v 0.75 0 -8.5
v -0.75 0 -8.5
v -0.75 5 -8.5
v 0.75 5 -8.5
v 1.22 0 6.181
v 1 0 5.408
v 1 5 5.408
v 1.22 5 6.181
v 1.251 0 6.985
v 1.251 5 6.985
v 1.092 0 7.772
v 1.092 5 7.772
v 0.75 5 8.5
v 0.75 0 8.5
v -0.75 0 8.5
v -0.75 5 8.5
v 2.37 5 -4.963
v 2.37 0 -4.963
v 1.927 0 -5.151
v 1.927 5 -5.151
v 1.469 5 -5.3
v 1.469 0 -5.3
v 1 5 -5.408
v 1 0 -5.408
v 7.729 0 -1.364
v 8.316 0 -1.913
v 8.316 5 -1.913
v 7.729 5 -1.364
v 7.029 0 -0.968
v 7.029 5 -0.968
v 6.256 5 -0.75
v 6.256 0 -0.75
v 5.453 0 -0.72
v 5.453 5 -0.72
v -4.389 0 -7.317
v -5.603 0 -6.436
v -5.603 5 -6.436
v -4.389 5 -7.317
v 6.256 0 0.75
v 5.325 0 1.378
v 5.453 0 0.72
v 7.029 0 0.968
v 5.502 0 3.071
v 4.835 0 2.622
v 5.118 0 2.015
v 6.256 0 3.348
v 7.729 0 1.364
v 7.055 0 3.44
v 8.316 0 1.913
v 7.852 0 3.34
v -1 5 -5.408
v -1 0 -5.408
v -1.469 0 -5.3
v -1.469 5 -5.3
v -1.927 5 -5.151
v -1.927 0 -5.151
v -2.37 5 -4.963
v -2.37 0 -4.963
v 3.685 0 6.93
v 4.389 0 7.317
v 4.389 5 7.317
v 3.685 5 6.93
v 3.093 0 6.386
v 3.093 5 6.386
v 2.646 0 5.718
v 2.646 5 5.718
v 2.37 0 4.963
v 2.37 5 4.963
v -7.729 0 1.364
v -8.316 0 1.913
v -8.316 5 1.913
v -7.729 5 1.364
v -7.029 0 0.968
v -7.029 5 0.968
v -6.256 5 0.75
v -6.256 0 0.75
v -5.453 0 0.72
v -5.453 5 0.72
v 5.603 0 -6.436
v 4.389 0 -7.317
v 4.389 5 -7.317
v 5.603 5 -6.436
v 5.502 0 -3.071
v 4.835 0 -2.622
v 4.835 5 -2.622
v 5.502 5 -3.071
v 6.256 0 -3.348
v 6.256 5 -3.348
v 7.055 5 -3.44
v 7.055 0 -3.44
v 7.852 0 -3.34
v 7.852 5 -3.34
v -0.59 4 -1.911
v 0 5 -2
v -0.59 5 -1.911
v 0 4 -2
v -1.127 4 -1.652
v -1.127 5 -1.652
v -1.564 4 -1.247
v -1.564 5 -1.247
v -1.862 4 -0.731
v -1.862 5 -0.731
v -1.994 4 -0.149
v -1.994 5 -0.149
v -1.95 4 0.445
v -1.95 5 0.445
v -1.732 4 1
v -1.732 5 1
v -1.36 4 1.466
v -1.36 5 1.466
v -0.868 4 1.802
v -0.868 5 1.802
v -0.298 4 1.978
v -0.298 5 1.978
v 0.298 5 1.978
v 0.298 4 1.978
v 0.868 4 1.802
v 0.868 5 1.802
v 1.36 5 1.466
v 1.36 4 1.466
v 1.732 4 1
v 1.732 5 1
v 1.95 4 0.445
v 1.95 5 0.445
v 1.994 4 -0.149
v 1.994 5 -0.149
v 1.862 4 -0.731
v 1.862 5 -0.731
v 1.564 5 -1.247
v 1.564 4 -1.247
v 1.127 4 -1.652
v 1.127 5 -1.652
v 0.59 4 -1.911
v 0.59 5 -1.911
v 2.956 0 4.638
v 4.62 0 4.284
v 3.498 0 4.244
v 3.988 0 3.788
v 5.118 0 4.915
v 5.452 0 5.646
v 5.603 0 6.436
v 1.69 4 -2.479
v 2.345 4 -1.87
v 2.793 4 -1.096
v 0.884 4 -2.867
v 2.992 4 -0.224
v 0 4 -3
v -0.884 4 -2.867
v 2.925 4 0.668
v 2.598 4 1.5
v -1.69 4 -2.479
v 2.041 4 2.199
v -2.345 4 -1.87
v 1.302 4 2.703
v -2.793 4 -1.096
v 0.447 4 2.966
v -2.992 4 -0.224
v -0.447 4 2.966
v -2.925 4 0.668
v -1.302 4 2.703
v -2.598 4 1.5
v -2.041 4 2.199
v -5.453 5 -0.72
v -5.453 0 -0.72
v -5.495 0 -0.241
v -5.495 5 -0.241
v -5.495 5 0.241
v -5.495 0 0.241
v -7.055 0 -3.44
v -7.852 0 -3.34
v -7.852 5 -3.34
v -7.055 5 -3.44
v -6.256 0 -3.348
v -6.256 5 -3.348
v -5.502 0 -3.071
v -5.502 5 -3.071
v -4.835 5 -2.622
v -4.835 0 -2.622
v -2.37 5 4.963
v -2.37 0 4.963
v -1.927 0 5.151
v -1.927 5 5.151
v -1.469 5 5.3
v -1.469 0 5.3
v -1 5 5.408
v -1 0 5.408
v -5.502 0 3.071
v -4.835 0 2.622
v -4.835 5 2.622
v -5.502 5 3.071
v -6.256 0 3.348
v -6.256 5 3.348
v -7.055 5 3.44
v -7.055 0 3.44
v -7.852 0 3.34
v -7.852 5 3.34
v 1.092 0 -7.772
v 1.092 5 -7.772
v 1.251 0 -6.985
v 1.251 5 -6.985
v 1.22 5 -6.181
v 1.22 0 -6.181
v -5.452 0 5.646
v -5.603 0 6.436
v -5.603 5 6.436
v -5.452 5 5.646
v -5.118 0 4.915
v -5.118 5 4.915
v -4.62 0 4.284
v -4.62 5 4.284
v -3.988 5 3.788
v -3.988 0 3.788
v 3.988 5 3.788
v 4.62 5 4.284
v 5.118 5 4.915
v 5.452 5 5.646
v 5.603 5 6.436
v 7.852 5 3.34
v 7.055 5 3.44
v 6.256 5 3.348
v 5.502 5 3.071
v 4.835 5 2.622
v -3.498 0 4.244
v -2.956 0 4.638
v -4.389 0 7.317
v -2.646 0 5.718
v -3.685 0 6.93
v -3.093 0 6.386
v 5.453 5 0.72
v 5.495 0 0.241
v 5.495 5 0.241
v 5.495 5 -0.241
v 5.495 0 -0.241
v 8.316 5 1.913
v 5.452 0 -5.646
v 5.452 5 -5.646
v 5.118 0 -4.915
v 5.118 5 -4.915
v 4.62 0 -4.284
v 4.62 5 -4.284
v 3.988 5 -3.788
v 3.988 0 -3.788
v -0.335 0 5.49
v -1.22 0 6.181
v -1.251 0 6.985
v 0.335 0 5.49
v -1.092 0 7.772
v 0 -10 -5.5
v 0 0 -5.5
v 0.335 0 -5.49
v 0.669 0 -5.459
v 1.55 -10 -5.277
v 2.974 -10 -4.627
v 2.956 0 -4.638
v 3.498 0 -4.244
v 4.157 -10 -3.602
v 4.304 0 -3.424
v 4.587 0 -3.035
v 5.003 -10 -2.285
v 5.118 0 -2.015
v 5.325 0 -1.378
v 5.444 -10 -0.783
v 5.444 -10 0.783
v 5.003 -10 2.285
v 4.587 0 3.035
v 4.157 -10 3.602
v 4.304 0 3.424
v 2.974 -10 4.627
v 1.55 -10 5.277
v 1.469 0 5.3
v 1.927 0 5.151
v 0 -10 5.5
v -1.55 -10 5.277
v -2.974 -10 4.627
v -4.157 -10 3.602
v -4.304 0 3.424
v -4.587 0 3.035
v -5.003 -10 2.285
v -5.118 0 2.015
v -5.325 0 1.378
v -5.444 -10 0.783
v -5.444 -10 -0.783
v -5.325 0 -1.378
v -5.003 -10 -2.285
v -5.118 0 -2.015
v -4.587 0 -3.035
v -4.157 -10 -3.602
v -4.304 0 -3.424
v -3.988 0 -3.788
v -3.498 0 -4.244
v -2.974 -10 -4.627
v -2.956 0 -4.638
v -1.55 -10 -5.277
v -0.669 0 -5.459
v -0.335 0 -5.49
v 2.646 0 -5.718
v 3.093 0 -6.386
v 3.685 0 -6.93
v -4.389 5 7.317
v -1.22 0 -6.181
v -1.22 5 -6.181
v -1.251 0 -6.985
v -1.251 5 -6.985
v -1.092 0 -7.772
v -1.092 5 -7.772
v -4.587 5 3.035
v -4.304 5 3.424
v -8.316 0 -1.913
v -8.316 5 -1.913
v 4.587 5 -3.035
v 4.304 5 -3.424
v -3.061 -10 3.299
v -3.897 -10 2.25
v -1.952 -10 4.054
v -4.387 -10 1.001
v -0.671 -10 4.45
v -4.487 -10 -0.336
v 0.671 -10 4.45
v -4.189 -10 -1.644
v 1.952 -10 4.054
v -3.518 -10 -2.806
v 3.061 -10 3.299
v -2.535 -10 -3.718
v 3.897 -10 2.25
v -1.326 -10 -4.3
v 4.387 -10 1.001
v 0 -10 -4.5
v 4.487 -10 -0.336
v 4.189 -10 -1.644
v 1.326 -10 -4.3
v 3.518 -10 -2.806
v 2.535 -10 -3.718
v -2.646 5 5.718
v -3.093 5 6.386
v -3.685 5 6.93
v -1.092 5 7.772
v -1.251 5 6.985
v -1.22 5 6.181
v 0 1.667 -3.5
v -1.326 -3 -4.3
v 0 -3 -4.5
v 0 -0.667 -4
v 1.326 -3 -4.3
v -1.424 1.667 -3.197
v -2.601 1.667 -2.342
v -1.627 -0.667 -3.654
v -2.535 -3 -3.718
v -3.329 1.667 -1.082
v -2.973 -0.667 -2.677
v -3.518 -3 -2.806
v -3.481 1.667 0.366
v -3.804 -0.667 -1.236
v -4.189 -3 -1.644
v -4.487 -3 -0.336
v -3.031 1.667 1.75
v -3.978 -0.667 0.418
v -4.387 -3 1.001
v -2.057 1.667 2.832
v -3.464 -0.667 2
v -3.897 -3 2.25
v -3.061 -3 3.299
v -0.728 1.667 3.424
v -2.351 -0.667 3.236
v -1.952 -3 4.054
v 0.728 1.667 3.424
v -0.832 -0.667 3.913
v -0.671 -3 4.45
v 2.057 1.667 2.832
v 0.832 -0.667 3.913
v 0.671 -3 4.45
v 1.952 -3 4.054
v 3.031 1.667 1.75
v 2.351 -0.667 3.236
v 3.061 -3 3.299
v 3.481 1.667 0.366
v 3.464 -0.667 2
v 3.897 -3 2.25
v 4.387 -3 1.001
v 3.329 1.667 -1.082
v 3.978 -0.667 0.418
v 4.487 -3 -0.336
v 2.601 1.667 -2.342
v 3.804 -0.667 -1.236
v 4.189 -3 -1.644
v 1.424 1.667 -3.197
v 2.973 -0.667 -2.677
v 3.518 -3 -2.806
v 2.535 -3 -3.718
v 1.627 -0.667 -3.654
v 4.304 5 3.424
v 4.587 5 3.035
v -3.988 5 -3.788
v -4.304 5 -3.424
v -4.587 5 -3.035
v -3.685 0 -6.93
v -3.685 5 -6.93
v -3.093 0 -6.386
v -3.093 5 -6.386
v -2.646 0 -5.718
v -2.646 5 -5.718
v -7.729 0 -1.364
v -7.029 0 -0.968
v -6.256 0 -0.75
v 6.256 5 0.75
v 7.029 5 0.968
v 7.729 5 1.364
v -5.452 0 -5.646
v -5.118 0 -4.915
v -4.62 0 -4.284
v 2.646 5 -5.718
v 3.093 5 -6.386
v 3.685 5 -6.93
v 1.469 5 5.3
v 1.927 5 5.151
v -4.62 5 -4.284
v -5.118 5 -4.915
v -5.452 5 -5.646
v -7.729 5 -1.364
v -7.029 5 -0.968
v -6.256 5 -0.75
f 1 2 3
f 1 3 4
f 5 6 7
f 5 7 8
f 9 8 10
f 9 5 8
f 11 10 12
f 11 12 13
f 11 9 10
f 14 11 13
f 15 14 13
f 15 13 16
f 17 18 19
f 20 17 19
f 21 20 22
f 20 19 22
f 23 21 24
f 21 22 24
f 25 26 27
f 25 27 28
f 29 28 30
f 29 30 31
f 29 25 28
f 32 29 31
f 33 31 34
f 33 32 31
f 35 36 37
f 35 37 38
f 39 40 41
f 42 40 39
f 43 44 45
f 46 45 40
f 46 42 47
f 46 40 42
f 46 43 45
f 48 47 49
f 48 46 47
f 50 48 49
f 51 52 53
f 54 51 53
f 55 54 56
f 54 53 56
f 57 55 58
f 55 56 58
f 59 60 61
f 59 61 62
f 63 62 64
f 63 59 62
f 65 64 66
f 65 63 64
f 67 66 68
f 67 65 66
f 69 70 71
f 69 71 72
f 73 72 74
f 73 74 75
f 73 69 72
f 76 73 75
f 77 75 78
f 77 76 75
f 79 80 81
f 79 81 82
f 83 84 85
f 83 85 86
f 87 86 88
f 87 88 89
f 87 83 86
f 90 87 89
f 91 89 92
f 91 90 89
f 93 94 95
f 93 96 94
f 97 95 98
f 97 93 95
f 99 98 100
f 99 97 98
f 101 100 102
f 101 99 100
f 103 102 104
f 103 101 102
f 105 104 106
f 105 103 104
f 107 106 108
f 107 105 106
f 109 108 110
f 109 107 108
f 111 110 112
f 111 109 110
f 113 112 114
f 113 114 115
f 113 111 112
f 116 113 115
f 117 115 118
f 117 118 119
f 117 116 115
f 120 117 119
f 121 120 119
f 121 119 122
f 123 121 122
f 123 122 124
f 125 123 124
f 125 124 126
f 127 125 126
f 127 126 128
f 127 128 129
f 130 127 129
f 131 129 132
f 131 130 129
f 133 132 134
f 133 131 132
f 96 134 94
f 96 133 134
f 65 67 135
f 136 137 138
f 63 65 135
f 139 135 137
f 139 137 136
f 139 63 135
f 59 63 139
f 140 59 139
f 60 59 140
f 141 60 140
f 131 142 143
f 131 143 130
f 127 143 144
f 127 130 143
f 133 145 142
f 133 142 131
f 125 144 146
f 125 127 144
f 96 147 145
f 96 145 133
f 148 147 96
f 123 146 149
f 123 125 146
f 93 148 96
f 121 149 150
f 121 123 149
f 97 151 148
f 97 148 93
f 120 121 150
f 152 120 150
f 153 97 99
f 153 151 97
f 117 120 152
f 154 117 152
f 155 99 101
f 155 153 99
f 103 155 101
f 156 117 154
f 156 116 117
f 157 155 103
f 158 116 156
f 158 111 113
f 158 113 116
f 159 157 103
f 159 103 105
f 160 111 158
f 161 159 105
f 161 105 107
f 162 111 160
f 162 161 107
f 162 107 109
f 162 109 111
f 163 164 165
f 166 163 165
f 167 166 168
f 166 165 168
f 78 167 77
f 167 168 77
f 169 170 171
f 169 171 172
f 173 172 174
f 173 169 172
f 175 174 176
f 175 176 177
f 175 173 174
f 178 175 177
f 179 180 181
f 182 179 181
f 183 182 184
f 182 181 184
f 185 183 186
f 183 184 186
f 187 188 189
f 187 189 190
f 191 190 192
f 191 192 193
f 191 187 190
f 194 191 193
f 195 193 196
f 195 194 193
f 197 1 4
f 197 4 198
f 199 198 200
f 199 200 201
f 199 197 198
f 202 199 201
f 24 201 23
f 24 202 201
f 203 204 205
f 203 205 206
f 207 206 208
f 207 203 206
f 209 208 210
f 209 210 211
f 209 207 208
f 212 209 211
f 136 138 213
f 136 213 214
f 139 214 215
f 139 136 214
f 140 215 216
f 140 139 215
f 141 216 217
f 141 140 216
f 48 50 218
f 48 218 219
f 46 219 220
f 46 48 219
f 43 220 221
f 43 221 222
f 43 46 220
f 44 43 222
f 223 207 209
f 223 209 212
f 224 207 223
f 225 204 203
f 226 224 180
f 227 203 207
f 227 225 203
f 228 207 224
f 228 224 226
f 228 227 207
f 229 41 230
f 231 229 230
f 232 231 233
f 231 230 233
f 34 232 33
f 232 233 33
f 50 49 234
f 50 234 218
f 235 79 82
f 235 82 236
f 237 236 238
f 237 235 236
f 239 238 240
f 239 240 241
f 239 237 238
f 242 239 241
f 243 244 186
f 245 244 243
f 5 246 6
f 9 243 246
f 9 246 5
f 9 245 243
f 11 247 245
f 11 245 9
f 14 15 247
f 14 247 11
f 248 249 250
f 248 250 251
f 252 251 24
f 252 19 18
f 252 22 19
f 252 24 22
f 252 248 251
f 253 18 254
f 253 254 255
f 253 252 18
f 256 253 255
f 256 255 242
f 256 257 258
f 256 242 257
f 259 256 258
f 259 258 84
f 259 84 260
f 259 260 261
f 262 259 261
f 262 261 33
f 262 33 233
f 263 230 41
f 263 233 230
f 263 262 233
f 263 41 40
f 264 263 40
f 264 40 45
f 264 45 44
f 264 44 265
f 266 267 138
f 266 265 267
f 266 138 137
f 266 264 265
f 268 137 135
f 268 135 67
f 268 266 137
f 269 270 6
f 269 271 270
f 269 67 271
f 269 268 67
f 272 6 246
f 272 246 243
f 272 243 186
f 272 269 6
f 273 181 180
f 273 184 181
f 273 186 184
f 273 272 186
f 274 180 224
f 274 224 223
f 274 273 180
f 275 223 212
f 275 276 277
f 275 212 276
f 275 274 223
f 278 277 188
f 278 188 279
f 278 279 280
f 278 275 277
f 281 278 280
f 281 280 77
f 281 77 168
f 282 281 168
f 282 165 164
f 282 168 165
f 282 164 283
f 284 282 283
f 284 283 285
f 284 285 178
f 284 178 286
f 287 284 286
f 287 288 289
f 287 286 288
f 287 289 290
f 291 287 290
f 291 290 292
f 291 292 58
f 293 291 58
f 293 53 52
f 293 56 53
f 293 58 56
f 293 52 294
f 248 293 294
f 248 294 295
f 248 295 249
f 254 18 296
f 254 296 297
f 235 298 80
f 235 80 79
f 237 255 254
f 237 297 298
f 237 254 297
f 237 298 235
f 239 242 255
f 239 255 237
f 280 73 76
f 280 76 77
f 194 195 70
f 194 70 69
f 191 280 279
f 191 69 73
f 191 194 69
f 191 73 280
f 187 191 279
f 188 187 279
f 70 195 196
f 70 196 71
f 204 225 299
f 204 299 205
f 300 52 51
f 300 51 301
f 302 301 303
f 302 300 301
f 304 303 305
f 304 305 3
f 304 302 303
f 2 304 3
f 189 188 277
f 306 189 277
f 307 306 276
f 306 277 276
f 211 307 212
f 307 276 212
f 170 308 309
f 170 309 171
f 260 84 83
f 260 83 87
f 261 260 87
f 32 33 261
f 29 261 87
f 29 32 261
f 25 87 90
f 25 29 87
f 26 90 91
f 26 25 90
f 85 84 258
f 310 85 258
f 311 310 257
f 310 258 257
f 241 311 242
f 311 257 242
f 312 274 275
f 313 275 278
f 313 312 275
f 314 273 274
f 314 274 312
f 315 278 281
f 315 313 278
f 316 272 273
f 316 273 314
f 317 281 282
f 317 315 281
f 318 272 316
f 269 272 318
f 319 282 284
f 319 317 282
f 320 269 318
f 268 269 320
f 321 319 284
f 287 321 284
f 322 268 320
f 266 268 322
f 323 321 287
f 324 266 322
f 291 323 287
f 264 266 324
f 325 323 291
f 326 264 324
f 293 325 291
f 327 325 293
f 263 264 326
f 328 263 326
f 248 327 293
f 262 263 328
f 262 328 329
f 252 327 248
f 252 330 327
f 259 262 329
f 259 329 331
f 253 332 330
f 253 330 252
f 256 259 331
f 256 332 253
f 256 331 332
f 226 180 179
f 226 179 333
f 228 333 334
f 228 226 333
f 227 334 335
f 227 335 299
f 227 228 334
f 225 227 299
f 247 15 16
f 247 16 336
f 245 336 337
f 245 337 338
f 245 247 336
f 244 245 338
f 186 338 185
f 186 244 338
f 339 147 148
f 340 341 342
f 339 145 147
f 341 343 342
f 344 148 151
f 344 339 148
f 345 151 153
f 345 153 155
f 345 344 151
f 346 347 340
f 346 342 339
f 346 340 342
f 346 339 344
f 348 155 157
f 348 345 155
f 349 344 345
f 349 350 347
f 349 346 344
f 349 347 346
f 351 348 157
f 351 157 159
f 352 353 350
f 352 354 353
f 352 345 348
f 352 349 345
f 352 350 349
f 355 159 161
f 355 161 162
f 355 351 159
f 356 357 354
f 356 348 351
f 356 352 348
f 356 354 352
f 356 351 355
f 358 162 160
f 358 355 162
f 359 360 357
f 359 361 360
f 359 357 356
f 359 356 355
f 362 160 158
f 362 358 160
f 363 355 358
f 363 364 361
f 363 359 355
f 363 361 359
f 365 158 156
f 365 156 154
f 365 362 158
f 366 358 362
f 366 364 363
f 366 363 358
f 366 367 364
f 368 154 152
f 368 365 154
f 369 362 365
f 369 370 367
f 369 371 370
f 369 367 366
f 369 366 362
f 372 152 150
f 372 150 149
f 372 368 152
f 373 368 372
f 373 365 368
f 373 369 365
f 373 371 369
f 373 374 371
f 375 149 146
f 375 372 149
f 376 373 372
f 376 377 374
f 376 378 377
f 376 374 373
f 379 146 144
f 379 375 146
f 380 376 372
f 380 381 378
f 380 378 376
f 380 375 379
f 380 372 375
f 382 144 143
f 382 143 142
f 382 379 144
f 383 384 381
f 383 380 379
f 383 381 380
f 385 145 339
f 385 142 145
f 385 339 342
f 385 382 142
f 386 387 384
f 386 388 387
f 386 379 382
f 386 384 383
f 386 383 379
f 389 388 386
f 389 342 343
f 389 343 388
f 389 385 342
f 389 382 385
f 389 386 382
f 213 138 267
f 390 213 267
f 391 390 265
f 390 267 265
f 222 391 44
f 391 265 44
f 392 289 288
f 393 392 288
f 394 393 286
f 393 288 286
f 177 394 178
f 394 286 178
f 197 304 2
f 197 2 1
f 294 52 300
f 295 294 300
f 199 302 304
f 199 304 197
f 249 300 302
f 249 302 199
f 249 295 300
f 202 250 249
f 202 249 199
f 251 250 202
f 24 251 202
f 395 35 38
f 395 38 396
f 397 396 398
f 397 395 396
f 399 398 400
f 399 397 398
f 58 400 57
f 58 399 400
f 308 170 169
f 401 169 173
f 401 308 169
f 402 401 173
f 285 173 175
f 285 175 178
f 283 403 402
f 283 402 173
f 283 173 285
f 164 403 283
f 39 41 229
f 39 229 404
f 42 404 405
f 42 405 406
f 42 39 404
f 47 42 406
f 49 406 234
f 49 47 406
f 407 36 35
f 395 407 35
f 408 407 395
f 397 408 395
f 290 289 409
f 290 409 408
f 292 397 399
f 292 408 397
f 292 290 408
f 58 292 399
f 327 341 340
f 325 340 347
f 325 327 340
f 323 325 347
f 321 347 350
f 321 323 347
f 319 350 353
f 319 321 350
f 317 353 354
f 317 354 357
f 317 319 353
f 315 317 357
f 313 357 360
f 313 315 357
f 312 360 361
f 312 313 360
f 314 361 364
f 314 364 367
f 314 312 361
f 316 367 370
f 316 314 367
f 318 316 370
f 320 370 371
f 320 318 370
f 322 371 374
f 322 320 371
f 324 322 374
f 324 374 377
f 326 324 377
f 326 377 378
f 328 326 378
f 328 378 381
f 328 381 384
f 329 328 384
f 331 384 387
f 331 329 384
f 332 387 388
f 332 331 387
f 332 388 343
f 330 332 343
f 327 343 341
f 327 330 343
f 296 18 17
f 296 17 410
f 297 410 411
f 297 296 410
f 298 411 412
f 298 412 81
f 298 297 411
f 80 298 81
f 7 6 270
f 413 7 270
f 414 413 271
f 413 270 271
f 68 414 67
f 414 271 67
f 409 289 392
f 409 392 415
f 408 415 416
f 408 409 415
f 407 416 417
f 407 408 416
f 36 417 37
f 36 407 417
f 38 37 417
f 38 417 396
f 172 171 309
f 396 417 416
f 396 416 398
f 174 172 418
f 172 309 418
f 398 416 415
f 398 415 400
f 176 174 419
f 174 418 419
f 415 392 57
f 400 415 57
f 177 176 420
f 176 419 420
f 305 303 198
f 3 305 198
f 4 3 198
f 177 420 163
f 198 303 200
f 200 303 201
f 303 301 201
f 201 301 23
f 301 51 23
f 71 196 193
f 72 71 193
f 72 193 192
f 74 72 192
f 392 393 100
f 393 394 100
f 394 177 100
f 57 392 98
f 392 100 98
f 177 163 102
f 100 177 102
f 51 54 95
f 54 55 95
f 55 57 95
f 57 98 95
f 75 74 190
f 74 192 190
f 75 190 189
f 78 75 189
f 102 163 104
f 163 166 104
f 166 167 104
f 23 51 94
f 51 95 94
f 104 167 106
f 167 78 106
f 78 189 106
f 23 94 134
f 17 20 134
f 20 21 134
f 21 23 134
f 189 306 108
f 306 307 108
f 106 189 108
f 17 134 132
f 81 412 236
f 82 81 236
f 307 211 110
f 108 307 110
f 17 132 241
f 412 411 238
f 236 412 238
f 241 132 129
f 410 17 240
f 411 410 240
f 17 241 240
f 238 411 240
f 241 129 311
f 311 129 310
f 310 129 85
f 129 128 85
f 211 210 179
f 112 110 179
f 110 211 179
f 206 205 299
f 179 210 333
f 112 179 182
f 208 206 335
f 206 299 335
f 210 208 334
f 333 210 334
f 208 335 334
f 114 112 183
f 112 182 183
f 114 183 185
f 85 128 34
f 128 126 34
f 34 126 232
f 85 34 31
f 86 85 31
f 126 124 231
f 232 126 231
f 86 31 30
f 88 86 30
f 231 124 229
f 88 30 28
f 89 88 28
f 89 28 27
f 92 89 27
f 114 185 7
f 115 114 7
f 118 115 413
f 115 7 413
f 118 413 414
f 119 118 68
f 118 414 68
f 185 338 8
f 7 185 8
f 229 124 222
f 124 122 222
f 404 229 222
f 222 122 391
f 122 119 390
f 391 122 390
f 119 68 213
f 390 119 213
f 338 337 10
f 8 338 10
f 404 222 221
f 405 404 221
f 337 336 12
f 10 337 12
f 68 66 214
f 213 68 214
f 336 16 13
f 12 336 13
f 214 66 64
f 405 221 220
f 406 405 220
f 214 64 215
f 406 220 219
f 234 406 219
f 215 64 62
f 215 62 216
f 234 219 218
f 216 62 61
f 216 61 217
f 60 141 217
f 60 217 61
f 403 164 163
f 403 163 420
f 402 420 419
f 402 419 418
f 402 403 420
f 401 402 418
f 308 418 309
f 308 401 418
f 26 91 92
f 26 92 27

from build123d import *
from build123d.topology import SkipClean

# Parameters (mm, degrees)
SKETCH_1_R      = 5.5
EXTRUDE_1_DEPTH = 5
EXTRUDE_START   = -5
EXTRUDE_2_DEPTH = 5
EXTRUDE_START_2 = 10
SKETCH_3_R      = 5.5
EXTRUDE_3_DEPTH = 10


with BuildPart() as part:
    # 草图1 → 凸台-拉伸1 (new body)
    with BuildSketch(Plane(origin=(0, 0, 0), x_dir=(1, 0, 0), z_dir=(0, 1, 0))):
        with Locations(Location((0, 0, 0), (0, 0, 270))):
            Circle(SKETCH_1_R)
    extrude(amount=EXTRUDE_1_DEPTH)

    # 草图2 → 凸台-拉伸2 (add)
    with BuildSketch(Plane(origin=(0, 5, 0), x_dir=(-1, 0, 0), z_dir=(0, 1, 0)).offset(EXTRUDE_START)):
        with BuildLine():
            Line((-4.389411899, -7.317483391), (-5.60293739, -6.435805513))
            ThreePointArc((-5.60293739, -6.435805513), (-5.11774735, -4.915167527), (-3.987951794, -3.787643132))
            ThreePointArc((-3.987951794, -3.787643132), (-3.232818888, -4.449593469), (-2.369917805, -4.963213636))
            ThreePointArc((-2.369917805, -4.963213636), (-3.093131201, -6.386137262), (-4.389411899, -7.317483391))
        make_face()
        with BuildLine():
            Line((-7.852217643, -3.339936839), (-8.315743134, -1.913352065))
            ThreePointArc((-8.315743134, -1.913352065), (-7.029407564, -0.968317642), (-5.452641547, -0.720208411))
            ThreePointArc((-5.452641547, -0.720208411), (-5.23081084, -1.699593469), (-4.834607559, -2.622321444))
            ThreePointArc((-4.834607559, -2.622321444), (-6.256073009, -3.34839667), (-7.852217643, -3.339936839))
        make_face()
        with BuildLine():
            Line((-8.315743134, 1.913352065), (-7.852217643, 3.339936839))
            ThreePointArc((-7.852217643, 3.339936839), (-6.256073009, 3.34839667), (-4.834607559, 2.622321444))
            ThreePointArc((-4.834607559, 2.622321444), (-5.23081084, 1.699593469), (-5.452641547, 0.720208411))
            ThreePointArc((-5.452641547, 0.720208411), (-7.029407564, 0.968317642), (-8.315743134, 1.913352065))
        make_face()
        with BuildLine():
            Line((-5.60293739, 6.435805513), (-4.389411899, 7.317483391))
            ThreePointArc((-4.389411899, 7.317483391), (-3.093131201, 6.386137262), (-2.369917805, 4.963213636))
            ThreePointArc((-2.369917805, 4.963213636), (-3.232818888, 4.449593469), (-3.987951794, 3.787643132))
            ThreePointArc((-3.987951794, 3.787643132), (-5.11774735, 4.915167527), (-5.60293739, 6.435805513))
        make_face()
        with BuildLine():
            Line((-0.75, 8.5), (0.75, 8.5))
            ThreePointArc((0.75, 8.5), (1.251281594, 6.984590476), (1, 5.408326913))
            ThreePointArc((1, 5.408326913), (0, 5.5), (-1, 5.408326913))
            ThreePointArc((-1, 5.408326913), (-1.251281594, 6.984590476), (-0.75, 8.5))
        make_face()
        with BuildLine():
            Line((4.389411899, 7.317483391), (5.60293739, 6.435805513))
            ThreePointArc((5.60293739, 6.435805513), (5.11774735, 4.915167527), (3.987951794, 3.787643132))
            ThreePointArc((3.987951794, 3.787643132), (3.232818888, 4.449593469), (2.369917805, 4.963213636))
            ThreePointArc((2.369917805, 4.963213636), (3.093131201, 6.386137262), (4.389411899, 7.317483391))
        make_face()
        with BuildLine():
            Line((0.75, -8.5), (-0.75, -8.5))
            ThreePointArc((-0.75, -8.5), (-1.251281594, -6.984590476), (-1, -5.408326913))
            ThreePointArc((-1, -5.408326913), (0, -5.5), (1, -5.408326913))
            ThreePointArc((1, -5.408326913), (1.251281594, -6.984590476), (0.75, -8.5))
        make_face()
        with BuildLine():
            Line((7.852217643, 3.339936839), (8.315743134, 1.913352065))
            ThreePointArc((8.315743134, 1.913352065), (7.029407564, 0.968317642), (5.452641547, 0.720208411))
            ThreePointArc((5.452641547, 0.720208411), (5.23081084, 1.699593469), (4.834607559, 2.622321444))
            ThreePointArc((4.834607559, 2.622321444), (6.256073009, 3.34839667), (7.852217643, 3.339936839))
        make_face()
        with BuildLine():
            Line((8.315743134, -1.913352065), (7.852217643, -3.339936839))
            ThreePointArc((7.852217643, -3.339936839), (6.256073009, -3.34839667), (4.834607559, -2.622321444))
            ThreePointArc((4.834607559, -2.622321444), (5.23081084, -1.699593469), (5.452641547, -0.720208411))
            ThreePointArc((5.452641547, -0.720208411), (7.029407564, -0.968317642), (8.315743134, -1.913352065))
        make_face()
        with BuildLine():
            Line((5.60293739, -6.435805513), (4.389411899, -7.317483391))
            ThreePointArc((4.389411899, -7.317483391), (3.093131201, -6.386137262), (2.369917805, -4.963213636))
            ThreePointArc((2.369917805, -4.963213636), (3.232818888, -4.449593469), (3.987951794, -3.787643132))
            ThreePointArc((3.987951794, -3.787643132), (5.11774735, -4.915167527), (5.60293739, -6.435805513))
        make_face()
    extrude(amount=EXTRUDE_2_DEPTH)

    # 草图3 → 凸台-拉伸3 (add)
    with SkipClean():  # the faces are left unmerged after this step: merging them gives an invalid solid
        with BuildSketch(Plane.XZ.offset(EXTRUDE_START_2)):
            with Locations(Location((0, 0, 0), (0, 0, 270))):
                Circle(SKETCH_3_R)
        extrude(amount=-EXTRUDE_3_DEPTH)

    # 草图4 → 切除-旋转1 (revolve, cut)
    with SkipClean():  # the faces are left unmerged after this step: merging them gives an invalid solid
        with BuildSketch(Plane.XY, mode=Mode.PRIVATE) as cut_revolve_1_sk:
            Polygon((0, -10), (0, -3), (0, 4), (0, 5), (2, 5), (2, 4), (3, 4), (4.5, -3), (4.5, -10), align=None)
        revolve(cut_revolve_1_sk.sketch.rotate(Axis((0, -3, 0), (0, 1, 0)), 90), axis=Axis((0, -3, 0), (0, 1, 0)), mode=Mode.SUBTRACT)


solid = part.part
